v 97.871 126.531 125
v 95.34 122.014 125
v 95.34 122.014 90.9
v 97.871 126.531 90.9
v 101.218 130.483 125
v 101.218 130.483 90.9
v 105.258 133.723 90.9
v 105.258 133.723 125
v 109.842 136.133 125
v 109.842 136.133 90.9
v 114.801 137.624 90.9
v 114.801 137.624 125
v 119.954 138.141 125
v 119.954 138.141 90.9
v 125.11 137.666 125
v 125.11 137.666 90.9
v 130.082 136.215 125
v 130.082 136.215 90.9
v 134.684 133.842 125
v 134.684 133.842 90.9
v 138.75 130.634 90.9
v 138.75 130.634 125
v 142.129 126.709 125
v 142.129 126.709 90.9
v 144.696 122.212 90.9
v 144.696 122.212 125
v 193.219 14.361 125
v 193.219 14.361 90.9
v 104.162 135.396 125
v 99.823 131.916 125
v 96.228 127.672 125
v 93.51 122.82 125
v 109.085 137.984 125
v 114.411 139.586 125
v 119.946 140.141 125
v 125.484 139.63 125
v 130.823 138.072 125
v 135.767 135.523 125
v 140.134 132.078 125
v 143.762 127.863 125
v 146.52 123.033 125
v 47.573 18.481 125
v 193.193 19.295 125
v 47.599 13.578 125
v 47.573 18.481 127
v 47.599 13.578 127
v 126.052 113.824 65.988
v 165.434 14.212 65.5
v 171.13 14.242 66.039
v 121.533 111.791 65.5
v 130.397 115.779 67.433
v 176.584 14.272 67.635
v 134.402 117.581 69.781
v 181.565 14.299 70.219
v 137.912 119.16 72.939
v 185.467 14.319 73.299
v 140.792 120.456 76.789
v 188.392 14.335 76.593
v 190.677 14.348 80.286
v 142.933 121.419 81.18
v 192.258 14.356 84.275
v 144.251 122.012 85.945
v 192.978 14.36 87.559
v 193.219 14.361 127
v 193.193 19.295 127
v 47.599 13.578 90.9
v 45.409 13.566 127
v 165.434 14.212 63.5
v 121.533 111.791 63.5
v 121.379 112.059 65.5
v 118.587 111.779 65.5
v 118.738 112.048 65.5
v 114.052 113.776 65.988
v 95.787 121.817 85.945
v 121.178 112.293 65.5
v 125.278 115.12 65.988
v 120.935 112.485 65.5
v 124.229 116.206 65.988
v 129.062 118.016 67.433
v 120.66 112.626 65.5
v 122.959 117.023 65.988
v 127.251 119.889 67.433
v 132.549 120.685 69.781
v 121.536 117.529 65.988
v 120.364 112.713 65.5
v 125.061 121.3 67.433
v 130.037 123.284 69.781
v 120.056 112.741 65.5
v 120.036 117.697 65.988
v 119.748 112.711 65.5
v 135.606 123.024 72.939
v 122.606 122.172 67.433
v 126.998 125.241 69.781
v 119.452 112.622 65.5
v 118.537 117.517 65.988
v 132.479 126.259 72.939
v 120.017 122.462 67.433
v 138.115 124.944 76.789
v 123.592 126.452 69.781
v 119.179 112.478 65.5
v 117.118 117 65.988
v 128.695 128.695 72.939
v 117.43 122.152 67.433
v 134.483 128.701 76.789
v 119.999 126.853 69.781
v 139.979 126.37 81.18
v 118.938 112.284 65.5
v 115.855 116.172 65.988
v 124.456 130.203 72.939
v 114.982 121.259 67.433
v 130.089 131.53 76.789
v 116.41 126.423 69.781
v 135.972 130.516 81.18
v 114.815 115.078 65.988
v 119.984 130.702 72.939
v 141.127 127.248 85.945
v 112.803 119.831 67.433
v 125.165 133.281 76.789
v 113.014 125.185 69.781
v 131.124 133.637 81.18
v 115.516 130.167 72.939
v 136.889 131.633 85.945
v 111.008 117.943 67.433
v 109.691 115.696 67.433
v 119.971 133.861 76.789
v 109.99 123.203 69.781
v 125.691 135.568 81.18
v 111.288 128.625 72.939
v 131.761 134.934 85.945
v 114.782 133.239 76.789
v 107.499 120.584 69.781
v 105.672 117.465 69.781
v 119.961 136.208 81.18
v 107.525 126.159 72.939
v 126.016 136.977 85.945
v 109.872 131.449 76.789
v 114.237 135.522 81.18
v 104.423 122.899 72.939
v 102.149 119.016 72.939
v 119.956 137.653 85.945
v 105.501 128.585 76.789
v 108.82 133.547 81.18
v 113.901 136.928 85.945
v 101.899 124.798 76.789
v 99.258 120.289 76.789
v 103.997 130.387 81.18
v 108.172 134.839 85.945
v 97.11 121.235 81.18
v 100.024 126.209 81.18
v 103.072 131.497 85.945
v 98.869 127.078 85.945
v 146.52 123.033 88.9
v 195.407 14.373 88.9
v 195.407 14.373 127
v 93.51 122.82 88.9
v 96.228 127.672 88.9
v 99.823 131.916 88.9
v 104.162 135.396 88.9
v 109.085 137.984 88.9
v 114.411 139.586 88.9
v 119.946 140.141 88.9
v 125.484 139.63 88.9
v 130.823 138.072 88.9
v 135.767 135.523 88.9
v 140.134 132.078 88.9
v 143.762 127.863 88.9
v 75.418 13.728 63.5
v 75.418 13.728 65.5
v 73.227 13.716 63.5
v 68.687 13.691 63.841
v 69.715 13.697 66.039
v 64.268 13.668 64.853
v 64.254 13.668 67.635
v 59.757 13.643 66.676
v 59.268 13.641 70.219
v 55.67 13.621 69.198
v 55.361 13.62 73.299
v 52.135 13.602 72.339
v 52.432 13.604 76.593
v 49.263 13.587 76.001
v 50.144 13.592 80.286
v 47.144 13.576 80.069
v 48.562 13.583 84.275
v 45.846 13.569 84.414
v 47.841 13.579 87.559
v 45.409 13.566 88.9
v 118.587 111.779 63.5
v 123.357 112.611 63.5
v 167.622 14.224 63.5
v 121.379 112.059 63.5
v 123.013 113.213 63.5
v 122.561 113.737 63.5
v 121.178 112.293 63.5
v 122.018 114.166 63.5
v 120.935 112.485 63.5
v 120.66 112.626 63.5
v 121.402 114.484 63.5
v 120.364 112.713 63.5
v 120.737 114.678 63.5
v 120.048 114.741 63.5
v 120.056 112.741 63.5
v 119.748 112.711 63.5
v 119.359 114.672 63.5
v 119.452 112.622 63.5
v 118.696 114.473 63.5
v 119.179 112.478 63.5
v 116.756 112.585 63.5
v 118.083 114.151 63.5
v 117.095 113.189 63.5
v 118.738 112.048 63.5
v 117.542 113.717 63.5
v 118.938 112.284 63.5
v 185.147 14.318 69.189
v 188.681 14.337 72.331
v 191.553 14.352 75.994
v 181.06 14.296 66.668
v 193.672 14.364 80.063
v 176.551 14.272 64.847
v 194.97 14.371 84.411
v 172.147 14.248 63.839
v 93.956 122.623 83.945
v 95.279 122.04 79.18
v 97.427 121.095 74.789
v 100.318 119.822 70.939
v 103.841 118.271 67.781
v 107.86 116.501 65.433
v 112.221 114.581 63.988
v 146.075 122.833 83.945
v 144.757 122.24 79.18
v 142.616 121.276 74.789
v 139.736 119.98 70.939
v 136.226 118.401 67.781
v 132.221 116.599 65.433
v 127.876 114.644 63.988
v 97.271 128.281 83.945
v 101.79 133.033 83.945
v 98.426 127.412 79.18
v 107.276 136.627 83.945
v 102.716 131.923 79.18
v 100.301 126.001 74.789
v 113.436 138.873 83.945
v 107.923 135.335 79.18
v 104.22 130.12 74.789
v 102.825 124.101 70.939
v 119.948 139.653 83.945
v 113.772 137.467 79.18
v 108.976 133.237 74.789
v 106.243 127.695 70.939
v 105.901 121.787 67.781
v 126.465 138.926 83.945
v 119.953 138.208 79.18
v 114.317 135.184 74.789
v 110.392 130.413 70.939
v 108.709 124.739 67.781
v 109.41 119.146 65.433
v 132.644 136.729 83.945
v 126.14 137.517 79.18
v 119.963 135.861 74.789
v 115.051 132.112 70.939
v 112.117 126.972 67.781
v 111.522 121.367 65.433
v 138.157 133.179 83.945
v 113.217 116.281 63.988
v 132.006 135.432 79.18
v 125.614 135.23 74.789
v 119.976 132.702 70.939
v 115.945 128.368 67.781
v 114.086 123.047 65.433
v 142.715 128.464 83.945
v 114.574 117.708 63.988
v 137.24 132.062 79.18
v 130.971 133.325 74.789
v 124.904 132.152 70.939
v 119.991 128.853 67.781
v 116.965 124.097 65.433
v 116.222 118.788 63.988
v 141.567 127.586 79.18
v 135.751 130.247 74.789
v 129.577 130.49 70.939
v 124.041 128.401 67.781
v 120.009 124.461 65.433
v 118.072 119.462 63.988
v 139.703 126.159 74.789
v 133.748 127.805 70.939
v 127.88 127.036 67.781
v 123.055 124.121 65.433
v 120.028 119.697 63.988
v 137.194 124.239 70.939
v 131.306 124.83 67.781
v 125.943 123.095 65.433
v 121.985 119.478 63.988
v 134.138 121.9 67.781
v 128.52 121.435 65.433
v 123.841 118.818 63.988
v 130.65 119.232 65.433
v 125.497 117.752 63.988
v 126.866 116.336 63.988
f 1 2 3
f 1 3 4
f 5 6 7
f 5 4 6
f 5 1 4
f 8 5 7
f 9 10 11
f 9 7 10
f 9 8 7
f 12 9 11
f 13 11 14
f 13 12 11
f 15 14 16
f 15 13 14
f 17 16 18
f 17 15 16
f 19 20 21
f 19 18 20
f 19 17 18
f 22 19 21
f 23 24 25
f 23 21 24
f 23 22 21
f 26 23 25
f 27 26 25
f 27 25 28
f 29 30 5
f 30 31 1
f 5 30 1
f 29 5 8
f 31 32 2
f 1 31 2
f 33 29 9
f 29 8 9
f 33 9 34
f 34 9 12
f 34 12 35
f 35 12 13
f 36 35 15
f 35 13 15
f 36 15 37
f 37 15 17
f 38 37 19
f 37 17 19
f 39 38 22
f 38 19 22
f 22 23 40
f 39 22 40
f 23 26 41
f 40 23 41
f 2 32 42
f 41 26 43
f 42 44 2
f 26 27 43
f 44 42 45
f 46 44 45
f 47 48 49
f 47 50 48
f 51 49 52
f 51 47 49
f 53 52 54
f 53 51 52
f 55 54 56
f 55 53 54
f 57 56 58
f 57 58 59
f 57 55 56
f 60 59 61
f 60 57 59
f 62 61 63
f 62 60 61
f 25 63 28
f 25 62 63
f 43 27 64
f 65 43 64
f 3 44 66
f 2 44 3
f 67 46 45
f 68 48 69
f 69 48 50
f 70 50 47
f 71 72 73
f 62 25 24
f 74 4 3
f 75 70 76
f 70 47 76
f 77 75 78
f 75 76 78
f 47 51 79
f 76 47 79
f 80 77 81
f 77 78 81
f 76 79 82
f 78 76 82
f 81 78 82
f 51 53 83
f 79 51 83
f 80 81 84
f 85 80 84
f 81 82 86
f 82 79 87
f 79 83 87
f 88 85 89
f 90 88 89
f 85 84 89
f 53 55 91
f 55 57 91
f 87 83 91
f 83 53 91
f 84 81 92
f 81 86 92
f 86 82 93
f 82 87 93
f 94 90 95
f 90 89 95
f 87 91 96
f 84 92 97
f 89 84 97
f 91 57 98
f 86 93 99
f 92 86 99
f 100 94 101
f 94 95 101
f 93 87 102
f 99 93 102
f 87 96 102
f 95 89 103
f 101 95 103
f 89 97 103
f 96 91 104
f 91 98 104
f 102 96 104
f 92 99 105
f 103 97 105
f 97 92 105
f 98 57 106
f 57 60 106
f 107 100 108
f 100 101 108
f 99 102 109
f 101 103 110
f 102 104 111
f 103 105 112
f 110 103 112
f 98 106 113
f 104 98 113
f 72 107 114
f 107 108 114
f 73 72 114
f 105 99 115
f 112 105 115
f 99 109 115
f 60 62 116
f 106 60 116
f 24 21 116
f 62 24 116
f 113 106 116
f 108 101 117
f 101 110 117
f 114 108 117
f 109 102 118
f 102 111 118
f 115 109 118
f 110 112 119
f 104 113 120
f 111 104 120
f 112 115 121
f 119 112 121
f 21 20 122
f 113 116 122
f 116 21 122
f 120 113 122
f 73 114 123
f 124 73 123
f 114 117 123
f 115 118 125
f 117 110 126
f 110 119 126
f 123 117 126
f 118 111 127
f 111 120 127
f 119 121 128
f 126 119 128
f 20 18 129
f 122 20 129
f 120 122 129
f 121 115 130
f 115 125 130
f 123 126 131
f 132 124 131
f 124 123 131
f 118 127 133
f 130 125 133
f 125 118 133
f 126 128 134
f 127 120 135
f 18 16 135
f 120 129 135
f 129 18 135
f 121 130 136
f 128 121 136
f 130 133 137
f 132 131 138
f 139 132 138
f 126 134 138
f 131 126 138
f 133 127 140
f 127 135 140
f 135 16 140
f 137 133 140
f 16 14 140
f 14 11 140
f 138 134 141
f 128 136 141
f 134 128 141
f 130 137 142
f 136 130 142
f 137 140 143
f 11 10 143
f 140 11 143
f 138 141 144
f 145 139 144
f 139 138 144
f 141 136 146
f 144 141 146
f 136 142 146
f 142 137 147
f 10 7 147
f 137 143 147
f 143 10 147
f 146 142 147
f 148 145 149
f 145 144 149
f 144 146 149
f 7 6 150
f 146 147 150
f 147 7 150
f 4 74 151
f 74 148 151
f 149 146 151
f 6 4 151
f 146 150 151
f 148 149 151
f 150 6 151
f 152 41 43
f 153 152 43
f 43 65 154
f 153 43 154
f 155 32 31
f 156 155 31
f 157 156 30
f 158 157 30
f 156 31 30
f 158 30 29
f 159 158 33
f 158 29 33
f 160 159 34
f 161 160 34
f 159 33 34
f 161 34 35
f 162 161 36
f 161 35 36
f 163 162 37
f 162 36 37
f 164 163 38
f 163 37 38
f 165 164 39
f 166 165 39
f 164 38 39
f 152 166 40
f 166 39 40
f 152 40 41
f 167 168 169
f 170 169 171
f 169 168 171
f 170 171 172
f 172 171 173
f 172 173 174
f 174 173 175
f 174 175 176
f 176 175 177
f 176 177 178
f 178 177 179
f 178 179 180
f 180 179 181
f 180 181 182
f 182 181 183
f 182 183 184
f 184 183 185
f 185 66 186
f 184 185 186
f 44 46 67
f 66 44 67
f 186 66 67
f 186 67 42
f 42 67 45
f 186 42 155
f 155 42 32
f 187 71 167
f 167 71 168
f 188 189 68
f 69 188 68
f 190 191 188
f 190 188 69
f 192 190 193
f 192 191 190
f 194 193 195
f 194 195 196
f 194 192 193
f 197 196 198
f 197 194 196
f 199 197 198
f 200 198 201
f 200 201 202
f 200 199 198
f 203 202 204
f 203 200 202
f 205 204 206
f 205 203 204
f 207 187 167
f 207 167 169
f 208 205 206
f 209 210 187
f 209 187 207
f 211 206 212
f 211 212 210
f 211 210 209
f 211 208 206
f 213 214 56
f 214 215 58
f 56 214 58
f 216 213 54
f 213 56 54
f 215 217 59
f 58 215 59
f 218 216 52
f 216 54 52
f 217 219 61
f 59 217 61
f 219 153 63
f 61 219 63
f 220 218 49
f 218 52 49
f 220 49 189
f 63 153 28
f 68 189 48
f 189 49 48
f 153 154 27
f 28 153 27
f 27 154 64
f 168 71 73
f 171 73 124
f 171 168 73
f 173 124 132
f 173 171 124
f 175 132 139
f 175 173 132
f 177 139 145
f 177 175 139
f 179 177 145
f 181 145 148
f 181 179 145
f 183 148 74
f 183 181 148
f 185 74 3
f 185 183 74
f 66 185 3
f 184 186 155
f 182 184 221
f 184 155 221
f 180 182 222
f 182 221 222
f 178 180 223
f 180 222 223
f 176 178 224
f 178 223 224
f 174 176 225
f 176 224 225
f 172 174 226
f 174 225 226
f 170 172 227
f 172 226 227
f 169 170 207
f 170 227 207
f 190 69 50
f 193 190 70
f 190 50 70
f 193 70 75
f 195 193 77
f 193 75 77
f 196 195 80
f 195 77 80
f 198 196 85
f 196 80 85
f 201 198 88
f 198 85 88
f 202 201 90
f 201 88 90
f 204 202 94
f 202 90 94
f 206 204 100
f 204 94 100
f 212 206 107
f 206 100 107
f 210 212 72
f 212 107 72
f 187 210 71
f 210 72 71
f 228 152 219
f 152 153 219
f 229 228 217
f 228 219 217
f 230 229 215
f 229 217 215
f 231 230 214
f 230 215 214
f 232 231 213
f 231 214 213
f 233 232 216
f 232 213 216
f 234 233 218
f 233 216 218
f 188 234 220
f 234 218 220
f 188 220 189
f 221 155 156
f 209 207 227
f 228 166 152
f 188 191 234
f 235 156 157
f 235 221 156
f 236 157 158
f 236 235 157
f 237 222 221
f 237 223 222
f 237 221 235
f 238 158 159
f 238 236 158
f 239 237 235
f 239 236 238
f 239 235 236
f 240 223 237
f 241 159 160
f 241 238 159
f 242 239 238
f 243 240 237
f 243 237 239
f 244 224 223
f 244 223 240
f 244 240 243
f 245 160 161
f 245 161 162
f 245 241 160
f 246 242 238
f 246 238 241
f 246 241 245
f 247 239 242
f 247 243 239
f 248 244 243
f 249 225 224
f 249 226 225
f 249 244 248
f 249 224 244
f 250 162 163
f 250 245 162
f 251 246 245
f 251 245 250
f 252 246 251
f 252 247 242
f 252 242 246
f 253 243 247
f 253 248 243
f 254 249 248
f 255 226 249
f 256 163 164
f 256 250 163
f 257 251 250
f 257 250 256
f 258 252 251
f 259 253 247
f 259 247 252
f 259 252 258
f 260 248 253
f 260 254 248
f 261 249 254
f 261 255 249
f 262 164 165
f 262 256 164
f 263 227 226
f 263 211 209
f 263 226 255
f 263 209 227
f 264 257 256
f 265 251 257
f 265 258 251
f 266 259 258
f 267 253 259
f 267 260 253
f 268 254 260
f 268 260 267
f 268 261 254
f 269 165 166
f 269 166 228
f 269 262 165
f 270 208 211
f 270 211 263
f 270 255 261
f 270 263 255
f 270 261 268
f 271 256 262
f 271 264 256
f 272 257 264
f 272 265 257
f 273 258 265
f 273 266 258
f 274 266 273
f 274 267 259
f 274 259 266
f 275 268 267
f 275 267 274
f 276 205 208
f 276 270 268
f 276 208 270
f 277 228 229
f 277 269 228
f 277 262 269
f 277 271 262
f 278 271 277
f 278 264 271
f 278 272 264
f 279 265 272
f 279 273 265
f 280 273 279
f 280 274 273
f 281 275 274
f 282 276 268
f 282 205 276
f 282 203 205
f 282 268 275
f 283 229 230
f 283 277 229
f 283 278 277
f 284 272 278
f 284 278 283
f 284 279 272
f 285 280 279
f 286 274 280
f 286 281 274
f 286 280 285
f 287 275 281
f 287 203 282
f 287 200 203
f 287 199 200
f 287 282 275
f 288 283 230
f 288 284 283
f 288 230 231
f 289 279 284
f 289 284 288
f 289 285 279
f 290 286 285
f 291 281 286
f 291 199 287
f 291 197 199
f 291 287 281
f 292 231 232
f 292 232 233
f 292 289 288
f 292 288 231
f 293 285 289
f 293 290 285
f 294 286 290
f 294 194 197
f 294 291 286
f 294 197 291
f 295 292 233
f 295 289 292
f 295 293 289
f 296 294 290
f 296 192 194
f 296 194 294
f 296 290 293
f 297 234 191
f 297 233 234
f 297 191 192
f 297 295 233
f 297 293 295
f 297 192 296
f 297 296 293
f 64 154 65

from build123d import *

# Parameters (mm, degrees)
F1_DEPTH = 63.5
F2_T     = -2
F3_R     = 25.4
F4_ANGLE = 180
F5_ANGLE = -48
F6_W     = 145.6223272032
F6_H     = 2
F7_DEPTH = 127
F8_DEPTH = 25.4


# Not quite as in the source:
# - a feature names something its author has since deleted; it is built from what else it names


with BuildPart() as f1:
    # F0 (on Top) → F1 (new body)
    with BuildSketch(Plane.XY):
        with BuildLine():
            Line((-10.2850095064, 143.0450051312), (-58.2692639971, 33.9835022184))
            Line((-58.2692639971, 33.9835022184), (91.7307360029, 34.4206405823))
            Line((91.7307360029, 34.4206405823), (42.7254554371, 143.2713651338))
            ThreePointArc((42.7254554371, 143.2713651338), (44.5808039736, 137.7049772305), (45.2782310553, 131.8791221047))
            Line((45.2782310553, 131.8791221047), (45.4024820726, 131.3612216192))
            Line((45.4024820726, 131.3612216192), (45.2828539684, 131.3612216192))
            ThreePointArc((45.2828539684, 131.3612216192), (16.2705971829, 102.3489648337), (-12.7416596027, 131.3612216192))
            ThreePointArc((-12.7416596027, 131.3612216192), (-12.1208550885, 137.3308515669), (-10.2850095064, 143.0450051312))
        make_face()
        with BuildLine():
            ThreePointArc((42.7254554371, 143.2713651338), (16.1467130657, 160.3732139071), (-10.2850095064, 143.0450051312))
            ThreePointArc((-10.2850095064, 143.0450051312), (-12.1208550885, 137.3308515669), (-12.7416596027, 131.3612216192))
            Line((-12.7416596027, 131.3612216192), (45.2828539684, 131.3612216192))
            ThreePointArc((45.2828539684, 131.3612216192), (45.2816982171, 131.6201821781), (45.2782310553, 131.8791221047))
            ThreePointArc((45.2782310553, 131.8791221047), (44.5808039736, 137.7049772305), (42.7254554371, 143.2713651338))
        make_face()
        with BuildLine():
            Line((45.2828539684, 131.3612216192), (-12.7416596027, 131.3612216192))
            ThreePointArc((-12.7416596027, 131.3612216192), (16.2705971829, 102.3489648337), (45.2828539684, 131.3612216192))
        make_face()
        with BuildLine():
            Line((45.4024820726, 131.3612216192), (45.2782310553, 131.8791221047))
            ThreePointArc((45.2782310553, 131.8791221047), (45.2816982171, 131.6201821781), (45.2828539684, 131.3612216192))
            Line((45.2828539684, 131.3612216192), (45.4024820726, 131.3612216192))
        make_face()
    extrude(amount=F1_DEPTH)

    # F2
    f2_openings = [f1.faces().sort_by_distance(p)[0] for p in [
        (16.730736, 34.202071, 31.75),
    ]]
    offset(amount=F2_T, openings=f2_openings)

    # F3
    f3_edges = [f1.edges().sort_by_distance(p)[0] for p in [
        (16.146713, 160.373214, 63.5),
        (16.155253, 158.373232, 61.5),
    ]]
    fillet(f3_edges, radius=F3_R)


with BuildPart() as f1_1:
    # F4: moved
    add(f1.part.rotate(Axis((41.7381236511, 83.5918491789, 63.5), (-0.4105210981, 0.9118510997, 0)), F4_ANGLE))


with BuildPart() as f1_2:
    # F5: moved
    add(f1_1.part.rotate(Axis((45.4087001389, 13.5661687977, 95.25), (0, 0, 1)), F5_ANGLE))

    # F6 (on face) → F7 (cut)
    with BuildSketch(Plane(origin=(-0.0716524101, 13.3215442397, 0), x_dir=(0.9999855352, 0.0053786087, 0), z_dir=(0.0053786087, -0.9999855352, 0))):
        with Locations((120.4826499572, 126)):
            Rectangle(F6_W, F6_H)
    extrude(amount=-F7_DEPTH, mode=Mode.SUBTRACT)

    # F8 (cut): a face of the model
    f8_faces = [f1_2.faces().sort_by_distance(p)[0] for p in [
        (120.299637411, 47.6367123165, 65.5),
    ]]
    extrude(f8_faces, amount=-F8_DEPTH, mode=Mode.SUBTRACT)


solid = f1_2.part
